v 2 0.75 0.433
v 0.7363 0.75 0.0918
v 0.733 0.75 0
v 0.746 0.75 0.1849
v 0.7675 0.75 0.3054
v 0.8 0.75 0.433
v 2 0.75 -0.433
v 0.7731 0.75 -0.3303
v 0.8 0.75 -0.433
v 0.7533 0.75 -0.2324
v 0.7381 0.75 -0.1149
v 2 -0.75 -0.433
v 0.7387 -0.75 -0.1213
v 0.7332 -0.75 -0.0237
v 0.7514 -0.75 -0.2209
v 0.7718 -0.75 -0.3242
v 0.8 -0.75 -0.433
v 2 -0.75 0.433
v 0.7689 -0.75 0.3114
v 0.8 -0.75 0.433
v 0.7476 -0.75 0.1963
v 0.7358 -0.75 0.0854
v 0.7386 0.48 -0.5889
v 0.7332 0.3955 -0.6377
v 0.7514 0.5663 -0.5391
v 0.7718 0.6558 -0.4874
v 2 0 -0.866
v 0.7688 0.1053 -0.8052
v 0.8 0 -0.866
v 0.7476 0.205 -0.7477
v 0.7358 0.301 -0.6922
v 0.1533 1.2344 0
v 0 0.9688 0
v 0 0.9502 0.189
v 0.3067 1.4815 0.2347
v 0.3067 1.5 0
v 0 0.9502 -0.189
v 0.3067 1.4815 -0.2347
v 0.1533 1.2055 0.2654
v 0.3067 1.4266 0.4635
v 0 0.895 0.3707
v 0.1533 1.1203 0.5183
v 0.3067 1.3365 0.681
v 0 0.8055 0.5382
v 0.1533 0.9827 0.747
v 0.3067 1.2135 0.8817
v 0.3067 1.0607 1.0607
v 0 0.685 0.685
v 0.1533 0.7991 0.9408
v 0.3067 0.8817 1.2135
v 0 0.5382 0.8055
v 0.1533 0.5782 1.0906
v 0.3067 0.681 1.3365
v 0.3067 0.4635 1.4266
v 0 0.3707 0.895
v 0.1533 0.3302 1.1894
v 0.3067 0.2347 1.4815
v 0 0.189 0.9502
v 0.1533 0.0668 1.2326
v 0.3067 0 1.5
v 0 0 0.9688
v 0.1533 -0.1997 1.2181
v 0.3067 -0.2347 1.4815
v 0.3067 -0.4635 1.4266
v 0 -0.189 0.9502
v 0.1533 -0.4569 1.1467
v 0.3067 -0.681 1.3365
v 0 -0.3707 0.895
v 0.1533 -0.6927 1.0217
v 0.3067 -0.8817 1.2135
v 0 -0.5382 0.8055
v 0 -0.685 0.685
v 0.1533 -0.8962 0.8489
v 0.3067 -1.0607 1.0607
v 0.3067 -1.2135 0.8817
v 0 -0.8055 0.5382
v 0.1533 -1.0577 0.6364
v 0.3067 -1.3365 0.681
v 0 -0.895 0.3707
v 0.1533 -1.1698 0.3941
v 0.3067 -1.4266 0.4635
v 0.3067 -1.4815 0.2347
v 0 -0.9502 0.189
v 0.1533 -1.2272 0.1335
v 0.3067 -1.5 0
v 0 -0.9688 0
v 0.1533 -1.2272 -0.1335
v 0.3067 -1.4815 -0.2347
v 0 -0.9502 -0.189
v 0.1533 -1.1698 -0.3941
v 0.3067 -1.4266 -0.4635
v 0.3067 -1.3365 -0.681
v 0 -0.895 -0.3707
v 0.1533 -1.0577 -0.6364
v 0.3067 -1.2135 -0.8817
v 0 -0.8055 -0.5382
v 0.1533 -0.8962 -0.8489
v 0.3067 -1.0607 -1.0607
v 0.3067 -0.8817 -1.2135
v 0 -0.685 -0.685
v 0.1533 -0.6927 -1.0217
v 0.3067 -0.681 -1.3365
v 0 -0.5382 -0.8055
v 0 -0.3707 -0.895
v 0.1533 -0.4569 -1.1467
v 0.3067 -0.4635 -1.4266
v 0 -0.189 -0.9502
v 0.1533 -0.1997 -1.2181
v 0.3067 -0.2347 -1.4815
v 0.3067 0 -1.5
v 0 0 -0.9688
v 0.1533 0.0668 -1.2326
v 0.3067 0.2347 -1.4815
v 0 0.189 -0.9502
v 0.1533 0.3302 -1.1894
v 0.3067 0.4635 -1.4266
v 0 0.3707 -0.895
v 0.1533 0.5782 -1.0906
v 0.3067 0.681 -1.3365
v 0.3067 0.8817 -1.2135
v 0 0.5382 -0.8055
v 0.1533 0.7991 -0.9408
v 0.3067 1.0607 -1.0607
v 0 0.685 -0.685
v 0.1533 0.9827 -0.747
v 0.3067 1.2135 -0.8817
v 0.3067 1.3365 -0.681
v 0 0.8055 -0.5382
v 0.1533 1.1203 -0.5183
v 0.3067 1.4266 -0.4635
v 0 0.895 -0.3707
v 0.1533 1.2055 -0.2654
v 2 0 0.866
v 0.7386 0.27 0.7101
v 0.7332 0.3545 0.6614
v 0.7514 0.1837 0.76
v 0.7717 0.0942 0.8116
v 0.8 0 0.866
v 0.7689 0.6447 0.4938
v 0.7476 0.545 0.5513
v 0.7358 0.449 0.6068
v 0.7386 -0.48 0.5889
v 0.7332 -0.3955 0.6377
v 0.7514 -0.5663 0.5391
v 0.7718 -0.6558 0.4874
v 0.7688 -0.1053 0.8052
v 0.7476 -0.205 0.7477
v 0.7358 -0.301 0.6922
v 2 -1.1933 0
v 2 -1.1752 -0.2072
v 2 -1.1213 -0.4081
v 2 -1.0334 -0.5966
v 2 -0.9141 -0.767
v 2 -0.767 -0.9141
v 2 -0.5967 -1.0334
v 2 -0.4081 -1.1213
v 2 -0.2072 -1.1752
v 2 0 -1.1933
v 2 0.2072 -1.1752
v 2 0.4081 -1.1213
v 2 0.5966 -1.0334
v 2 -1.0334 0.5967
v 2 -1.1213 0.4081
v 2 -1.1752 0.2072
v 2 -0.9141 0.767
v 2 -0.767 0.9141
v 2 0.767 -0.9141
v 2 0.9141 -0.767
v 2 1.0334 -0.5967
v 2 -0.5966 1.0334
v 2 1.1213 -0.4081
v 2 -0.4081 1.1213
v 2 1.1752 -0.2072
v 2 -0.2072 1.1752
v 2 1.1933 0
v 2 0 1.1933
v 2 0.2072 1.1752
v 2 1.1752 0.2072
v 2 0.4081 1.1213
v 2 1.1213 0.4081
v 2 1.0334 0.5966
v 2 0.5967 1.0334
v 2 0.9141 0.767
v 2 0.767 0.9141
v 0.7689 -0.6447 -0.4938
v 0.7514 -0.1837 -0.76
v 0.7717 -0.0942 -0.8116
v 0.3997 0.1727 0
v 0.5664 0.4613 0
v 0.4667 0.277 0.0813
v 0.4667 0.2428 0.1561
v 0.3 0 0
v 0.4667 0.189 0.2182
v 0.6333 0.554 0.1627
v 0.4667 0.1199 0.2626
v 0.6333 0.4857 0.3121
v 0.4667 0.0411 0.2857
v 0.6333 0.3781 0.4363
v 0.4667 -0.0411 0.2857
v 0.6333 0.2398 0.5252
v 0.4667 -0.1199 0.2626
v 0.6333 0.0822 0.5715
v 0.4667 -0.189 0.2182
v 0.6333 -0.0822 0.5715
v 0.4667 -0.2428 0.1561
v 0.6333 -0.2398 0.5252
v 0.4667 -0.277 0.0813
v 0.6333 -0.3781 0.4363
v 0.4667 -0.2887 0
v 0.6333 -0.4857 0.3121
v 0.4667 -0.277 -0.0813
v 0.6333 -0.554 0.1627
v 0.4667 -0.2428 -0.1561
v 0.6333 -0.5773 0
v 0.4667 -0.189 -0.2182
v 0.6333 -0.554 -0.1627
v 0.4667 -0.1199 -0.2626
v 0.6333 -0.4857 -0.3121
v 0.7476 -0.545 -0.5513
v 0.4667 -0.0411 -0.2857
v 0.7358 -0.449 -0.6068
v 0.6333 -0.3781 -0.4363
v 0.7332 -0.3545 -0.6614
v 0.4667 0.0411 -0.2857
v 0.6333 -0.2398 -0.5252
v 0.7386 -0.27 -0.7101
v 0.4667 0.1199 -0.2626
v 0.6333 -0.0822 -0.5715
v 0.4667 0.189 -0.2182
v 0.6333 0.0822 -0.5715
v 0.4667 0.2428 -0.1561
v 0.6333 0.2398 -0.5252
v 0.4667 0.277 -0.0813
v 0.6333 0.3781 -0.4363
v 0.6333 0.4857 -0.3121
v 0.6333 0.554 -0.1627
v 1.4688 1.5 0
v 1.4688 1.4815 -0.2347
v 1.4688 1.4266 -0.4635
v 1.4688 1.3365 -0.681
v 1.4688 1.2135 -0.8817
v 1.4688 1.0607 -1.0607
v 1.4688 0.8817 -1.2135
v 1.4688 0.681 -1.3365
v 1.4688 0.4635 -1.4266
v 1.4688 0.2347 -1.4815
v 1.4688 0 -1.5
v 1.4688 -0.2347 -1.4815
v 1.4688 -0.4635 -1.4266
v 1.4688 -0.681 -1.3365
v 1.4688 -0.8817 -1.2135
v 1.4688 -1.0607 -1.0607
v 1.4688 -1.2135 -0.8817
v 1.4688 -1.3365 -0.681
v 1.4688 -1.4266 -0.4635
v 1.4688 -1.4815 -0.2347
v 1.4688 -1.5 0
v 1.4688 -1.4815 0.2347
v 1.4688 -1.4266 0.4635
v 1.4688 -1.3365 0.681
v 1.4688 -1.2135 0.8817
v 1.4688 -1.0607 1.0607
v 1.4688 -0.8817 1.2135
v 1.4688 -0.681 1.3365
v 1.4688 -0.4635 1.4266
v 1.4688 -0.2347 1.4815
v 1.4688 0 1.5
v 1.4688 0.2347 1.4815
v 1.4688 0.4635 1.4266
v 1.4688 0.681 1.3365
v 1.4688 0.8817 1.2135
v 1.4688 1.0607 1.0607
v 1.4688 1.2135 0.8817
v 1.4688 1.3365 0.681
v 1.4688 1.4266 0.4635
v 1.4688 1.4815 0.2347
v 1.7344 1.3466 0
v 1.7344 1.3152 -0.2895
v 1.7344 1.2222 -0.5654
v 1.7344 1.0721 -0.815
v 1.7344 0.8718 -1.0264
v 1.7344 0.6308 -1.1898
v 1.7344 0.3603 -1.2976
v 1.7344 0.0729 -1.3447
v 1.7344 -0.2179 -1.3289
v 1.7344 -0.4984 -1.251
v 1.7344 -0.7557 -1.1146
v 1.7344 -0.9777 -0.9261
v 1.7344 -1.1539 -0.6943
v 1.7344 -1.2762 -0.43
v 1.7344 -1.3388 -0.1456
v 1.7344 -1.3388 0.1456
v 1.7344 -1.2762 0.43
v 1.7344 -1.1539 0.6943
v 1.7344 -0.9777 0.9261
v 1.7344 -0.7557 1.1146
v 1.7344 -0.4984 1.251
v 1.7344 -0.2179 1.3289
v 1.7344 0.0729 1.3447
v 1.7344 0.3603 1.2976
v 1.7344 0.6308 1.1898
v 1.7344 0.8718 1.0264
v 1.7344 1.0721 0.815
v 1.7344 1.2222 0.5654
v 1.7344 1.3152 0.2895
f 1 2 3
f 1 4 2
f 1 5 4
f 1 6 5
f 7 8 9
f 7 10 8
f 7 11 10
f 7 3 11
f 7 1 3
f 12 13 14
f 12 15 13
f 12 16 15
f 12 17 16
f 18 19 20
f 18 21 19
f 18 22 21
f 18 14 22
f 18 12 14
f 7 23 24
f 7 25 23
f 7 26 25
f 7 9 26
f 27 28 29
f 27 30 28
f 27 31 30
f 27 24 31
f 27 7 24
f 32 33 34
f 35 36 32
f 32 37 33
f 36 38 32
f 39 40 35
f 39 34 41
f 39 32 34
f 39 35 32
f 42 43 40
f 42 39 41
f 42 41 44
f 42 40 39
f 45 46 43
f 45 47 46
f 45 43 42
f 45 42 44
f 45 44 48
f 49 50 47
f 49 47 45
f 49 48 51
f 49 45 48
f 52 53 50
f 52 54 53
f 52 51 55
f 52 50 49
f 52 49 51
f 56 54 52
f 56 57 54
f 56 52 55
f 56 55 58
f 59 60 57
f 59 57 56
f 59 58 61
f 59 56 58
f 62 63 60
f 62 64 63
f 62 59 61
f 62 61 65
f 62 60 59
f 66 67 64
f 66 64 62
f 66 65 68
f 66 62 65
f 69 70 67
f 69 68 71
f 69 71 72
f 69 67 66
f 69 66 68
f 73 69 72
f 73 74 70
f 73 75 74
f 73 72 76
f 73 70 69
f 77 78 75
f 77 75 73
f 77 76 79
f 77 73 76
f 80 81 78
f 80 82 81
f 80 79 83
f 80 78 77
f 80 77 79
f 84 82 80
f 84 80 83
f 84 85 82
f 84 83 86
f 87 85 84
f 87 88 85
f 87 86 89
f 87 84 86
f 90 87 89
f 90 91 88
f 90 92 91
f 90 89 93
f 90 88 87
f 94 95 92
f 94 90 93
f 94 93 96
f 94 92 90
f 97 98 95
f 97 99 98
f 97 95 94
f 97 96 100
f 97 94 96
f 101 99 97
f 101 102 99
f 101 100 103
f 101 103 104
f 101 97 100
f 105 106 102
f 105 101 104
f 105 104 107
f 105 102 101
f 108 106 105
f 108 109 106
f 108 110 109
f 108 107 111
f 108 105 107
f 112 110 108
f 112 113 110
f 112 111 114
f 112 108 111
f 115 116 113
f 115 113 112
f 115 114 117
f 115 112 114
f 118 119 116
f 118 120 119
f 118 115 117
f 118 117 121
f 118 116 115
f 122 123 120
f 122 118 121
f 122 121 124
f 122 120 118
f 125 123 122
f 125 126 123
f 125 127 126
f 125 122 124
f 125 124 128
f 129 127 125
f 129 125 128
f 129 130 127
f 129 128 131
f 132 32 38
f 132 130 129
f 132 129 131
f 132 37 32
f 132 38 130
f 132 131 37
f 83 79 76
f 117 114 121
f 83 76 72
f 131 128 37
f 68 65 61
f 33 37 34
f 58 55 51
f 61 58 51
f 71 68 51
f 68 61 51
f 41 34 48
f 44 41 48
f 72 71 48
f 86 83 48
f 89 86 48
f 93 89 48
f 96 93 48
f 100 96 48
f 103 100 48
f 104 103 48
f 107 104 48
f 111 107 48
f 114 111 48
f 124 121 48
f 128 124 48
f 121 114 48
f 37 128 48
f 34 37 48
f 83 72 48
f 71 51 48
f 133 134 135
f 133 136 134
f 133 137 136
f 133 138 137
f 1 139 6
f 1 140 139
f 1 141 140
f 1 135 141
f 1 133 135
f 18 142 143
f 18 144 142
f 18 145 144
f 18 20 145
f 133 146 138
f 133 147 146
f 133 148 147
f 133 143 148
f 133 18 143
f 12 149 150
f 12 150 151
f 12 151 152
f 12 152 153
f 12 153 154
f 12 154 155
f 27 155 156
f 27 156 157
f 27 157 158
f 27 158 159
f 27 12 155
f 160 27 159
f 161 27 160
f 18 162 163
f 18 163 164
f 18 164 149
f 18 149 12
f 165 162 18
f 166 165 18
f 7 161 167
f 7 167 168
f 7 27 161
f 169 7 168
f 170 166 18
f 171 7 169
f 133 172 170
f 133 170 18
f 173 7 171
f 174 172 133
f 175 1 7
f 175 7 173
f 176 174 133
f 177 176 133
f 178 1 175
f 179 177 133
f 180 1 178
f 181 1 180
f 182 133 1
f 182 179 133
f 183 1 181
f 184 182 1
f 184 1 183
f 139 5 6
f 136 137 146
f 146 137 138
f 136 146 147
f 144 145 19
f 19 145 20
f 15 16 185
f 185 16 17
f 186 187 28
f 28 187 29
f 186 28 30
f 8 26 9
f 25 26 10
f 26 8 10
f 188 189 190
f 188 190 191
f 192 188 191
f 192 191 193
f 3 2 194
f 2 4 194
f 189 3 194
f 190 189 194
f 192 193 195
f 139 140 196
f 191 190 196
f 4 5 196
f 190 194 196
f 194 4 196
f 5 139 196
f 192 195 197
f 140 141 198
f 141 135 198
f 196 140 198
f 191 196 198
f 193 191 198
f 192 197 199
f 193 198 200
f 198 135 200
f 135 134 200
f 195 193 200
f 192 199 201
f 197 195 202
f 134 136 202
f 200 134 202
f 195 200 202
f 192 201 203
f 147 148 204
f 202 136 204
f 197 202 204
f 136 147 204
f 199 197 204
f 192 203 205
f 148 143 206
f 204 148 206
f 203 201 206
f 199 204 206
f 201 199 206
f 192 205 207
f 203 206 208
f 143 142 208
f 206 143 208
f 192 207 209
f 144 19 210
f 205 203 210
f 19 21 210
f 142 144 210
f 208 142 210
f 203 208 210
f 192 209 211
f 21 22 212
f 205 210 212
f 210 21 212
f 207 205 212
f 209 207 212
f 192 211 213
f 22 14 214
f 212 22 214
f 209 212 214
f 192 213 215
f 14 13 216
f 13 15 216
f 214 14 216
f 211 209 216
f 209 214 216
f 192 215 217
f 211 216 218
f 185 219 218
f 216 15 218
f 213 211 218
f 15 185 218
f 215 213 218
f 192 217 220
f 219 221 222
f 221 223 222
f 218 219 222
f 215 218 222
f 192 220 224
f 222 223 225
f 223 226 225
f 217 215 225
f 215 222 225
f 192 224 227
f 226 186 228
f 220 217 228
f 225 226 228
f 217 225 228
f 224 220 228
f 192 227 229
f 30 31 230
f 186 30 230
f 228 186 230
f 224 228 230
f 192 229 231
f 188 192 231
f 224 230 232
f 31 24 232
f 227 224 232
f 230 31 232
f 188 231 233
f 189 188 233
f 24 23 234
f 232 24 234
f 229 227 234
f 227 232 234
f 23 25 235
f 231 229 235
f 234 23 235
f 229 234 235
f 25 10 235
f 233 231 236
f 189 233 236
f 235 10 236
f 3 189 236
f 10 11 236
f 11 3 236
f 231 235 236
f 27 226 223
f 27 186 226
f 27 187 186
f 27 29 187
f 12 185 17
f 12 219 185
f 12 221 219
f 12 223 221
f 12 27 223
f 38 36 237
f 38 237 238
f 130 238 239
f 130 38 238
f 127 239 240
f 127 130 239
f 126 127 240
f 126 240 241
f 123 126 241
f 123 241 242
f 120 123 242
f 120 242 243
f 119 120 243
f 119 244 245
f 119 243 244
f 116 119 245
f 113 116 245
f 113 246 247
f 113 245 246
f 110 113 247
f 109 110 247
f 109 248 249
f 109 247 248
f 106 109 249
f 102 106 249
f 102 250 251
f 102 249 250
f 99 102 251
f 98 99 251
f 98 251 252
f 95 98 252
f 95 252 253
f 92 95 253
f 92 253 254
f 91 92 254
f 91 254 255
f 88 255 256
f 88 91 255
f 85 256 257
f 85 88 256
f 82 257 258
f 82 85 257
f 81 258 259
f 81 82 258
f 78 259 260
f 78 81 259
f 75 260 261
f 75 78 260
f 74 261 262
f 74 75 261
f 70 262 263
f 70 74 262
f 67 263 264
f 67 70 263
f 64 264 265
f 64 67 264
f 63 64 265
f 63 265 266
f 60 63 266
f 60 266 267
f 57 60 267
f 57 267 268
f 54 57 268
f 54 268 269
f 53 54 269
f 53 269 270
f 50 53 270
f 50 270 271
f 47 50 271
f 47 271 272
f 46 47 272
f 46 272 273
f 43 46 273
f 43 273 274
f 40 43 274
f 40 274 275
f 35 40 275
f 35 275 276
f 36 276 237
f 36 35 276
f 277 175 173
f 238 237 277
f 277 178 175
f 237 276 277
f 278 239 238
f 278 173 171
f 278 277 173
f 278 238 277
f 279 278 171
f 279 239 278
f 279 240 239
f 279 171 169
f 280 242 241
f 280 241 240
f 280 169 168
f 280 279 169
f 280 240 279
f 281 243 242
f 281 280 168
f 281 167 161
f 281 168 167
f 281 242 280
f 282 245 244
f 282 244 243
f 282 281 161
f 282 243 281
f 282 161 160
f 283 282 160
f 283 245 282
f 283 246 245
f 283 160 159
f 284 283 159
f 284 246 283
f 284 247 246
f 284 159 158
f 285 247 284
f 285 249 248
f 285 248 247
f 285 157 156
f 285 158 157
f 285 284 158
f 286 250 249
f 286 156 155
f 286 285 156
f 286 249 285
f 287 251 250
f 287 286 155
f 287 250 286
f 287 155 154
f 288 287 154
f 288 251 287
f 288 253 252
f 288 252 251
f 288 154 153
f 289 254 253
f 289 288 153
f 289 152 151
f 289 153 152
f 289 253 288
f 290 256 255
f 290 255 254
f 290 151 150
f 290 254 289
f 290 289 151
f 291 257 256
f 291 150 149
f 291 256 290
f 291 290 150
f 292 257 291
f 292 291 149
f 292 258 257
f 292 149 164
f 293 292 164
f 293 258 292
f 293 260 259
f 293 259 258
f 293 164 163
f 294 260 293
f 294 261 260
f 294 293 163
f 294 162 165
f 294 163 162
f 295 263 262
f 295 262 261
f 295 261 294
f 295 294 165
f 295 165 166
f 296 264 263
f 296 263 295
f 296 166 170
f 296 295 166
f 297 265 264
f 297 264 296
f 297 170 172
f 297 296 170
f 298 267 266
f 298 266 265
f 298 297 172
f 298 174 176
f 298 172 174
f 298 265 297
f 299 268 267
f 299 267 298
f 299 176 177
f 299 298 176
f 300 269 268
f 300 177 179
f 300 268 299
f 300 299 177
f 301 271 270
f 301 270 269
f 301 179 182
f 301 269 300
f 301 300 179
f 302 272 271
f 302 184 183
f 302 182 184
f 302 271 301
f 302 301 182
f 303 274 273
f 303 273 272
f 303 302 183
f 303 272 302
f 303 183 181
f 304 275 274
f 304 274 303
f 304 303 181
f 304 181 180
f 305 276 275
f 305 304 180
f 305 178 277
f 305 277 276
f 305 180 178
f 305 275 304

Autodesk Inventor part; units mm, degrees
ref_plane "YZ Plane" through (0, 0, 0) normal (1, 0, 0) x (0, 1, 0)
ref_plane "XZ Plane" through (0, 0, 0) normal (0, 1, 0) x (-1, 0, 0)
sketch "Sketch1" plane through (0, 0, 0) normal (0, 0, 1) x (1, 0, 0)
  line L0 (0, 0) -> (0.3, 0)
  line L1 (2, 0.866) -> (2, 1.5)
  line L2 (2, 1.5) -> (0, 1.5)
  line L3 (2, 0.866) -> (0.8, 0.866)
  line L4 (0.8, 0.866) -> (0.3, 0)
  line L5 (0, -0.3) -> (0, 1.8) projected
  line L6 (0, 1.5) -> (0, 0)
  dimension "d0" = 1.2
  dimension "d1" = 60
  dimension "d2" = 3
  dimension "d3" = 1.7321
  dimension "d5" = 2
revolve "Body" add sketch "Sketch1" angle 360 about axis through (0, 0, 0) along (1, 0, 0)
chamfer "Chamfer1" distance 0.3067 angle 60 1 edges at (2, -1.5, 0) measured on face at (2, 1.2658, -0.1887)
sketch "Sketch2" plane through (2, 0, 0) normal (1, 0, 0) x (0, 0, -1)
  circle A0 centre (0, 0) radius 0.866 projected
  line L0 (-0.433, 0.75) -> (0.433, 0.75)
  line L1 (0.433, 0.75) -> (0.866, 0)
  line L2 (0.866, 0) -> (0.433, -0.75)
  line L3 (0.433, -0.75) -> (-0.433, -0.75)
  line L4 (-0.433, -0.75) -> (-0.866, 0)
  line L5 (-0.866, 0) -> (-0.433, 0.75)
extrude "Slot" add sketch "Sketch2" against normal up to next contours L1 A0 | A0 L2 | L0 A0 | A0 L3 | L5 A0 | A0 L4
thread "Thread" size "M3x0.5" class "6g" standard "ISO Metric profile" length 2
chamfer "Chamfer2" distance 0.3067 angle 60 1 edges at (0, -1.5, 0) measured on face at (0.4896, 1.4951, -0.1207)
ref_plane "Work Plane1" through (1, 0, 0) normal (0, 0.5, 0.866) x (1, 0, 0)
equation "\"d7\" = -0.5 * GD1 + 0.5 * NND"
equation "\"d8\" = FAWI"
equation "\"d29\" = -0.5 * GD1 + 0.5 * NND"
equation "\"d11\" = NLG"
equation "\"d13\" = -0.5 * GD1 + 0.5 * NND"
equation "\"d14\" = FAWI"
equation "\"d30\" = -0.5 * GD1 + 0.5 * NND"
equation "\"d0\" = INTI"
equation "\"d2\" = NND"
equation "\"d3\" = 1.1547 * SW"
equation "\"d5\" = NLG"
equation "\"NND\" = 3"
equation "\"NLG\" = 2"
equation "\"INTI\" = 1.2"
equation "\"FAWI\" = 60deg"
equation "\"SW\" = 1.5"
equation "\"GD1\" = THREADDIA - 1.2269 * PTC"
equation "\"FAWI1\" = 45deg"
equation "\"GUL\" = 0.61345 * PTC"
equation "\"SPD\" = 2"
equation "\"TOA\" = 30deg"
equation "\"THREADDIA\" = 3"
equation "\"PTC\" = 0.5"
equation "\"GAL\" = 0.61345 * PTC"
equation "\"E0\" = 1.155 * SW"
properties part number "IS: 6094 - M3 x 2(1)" material "Steel, Mild"
